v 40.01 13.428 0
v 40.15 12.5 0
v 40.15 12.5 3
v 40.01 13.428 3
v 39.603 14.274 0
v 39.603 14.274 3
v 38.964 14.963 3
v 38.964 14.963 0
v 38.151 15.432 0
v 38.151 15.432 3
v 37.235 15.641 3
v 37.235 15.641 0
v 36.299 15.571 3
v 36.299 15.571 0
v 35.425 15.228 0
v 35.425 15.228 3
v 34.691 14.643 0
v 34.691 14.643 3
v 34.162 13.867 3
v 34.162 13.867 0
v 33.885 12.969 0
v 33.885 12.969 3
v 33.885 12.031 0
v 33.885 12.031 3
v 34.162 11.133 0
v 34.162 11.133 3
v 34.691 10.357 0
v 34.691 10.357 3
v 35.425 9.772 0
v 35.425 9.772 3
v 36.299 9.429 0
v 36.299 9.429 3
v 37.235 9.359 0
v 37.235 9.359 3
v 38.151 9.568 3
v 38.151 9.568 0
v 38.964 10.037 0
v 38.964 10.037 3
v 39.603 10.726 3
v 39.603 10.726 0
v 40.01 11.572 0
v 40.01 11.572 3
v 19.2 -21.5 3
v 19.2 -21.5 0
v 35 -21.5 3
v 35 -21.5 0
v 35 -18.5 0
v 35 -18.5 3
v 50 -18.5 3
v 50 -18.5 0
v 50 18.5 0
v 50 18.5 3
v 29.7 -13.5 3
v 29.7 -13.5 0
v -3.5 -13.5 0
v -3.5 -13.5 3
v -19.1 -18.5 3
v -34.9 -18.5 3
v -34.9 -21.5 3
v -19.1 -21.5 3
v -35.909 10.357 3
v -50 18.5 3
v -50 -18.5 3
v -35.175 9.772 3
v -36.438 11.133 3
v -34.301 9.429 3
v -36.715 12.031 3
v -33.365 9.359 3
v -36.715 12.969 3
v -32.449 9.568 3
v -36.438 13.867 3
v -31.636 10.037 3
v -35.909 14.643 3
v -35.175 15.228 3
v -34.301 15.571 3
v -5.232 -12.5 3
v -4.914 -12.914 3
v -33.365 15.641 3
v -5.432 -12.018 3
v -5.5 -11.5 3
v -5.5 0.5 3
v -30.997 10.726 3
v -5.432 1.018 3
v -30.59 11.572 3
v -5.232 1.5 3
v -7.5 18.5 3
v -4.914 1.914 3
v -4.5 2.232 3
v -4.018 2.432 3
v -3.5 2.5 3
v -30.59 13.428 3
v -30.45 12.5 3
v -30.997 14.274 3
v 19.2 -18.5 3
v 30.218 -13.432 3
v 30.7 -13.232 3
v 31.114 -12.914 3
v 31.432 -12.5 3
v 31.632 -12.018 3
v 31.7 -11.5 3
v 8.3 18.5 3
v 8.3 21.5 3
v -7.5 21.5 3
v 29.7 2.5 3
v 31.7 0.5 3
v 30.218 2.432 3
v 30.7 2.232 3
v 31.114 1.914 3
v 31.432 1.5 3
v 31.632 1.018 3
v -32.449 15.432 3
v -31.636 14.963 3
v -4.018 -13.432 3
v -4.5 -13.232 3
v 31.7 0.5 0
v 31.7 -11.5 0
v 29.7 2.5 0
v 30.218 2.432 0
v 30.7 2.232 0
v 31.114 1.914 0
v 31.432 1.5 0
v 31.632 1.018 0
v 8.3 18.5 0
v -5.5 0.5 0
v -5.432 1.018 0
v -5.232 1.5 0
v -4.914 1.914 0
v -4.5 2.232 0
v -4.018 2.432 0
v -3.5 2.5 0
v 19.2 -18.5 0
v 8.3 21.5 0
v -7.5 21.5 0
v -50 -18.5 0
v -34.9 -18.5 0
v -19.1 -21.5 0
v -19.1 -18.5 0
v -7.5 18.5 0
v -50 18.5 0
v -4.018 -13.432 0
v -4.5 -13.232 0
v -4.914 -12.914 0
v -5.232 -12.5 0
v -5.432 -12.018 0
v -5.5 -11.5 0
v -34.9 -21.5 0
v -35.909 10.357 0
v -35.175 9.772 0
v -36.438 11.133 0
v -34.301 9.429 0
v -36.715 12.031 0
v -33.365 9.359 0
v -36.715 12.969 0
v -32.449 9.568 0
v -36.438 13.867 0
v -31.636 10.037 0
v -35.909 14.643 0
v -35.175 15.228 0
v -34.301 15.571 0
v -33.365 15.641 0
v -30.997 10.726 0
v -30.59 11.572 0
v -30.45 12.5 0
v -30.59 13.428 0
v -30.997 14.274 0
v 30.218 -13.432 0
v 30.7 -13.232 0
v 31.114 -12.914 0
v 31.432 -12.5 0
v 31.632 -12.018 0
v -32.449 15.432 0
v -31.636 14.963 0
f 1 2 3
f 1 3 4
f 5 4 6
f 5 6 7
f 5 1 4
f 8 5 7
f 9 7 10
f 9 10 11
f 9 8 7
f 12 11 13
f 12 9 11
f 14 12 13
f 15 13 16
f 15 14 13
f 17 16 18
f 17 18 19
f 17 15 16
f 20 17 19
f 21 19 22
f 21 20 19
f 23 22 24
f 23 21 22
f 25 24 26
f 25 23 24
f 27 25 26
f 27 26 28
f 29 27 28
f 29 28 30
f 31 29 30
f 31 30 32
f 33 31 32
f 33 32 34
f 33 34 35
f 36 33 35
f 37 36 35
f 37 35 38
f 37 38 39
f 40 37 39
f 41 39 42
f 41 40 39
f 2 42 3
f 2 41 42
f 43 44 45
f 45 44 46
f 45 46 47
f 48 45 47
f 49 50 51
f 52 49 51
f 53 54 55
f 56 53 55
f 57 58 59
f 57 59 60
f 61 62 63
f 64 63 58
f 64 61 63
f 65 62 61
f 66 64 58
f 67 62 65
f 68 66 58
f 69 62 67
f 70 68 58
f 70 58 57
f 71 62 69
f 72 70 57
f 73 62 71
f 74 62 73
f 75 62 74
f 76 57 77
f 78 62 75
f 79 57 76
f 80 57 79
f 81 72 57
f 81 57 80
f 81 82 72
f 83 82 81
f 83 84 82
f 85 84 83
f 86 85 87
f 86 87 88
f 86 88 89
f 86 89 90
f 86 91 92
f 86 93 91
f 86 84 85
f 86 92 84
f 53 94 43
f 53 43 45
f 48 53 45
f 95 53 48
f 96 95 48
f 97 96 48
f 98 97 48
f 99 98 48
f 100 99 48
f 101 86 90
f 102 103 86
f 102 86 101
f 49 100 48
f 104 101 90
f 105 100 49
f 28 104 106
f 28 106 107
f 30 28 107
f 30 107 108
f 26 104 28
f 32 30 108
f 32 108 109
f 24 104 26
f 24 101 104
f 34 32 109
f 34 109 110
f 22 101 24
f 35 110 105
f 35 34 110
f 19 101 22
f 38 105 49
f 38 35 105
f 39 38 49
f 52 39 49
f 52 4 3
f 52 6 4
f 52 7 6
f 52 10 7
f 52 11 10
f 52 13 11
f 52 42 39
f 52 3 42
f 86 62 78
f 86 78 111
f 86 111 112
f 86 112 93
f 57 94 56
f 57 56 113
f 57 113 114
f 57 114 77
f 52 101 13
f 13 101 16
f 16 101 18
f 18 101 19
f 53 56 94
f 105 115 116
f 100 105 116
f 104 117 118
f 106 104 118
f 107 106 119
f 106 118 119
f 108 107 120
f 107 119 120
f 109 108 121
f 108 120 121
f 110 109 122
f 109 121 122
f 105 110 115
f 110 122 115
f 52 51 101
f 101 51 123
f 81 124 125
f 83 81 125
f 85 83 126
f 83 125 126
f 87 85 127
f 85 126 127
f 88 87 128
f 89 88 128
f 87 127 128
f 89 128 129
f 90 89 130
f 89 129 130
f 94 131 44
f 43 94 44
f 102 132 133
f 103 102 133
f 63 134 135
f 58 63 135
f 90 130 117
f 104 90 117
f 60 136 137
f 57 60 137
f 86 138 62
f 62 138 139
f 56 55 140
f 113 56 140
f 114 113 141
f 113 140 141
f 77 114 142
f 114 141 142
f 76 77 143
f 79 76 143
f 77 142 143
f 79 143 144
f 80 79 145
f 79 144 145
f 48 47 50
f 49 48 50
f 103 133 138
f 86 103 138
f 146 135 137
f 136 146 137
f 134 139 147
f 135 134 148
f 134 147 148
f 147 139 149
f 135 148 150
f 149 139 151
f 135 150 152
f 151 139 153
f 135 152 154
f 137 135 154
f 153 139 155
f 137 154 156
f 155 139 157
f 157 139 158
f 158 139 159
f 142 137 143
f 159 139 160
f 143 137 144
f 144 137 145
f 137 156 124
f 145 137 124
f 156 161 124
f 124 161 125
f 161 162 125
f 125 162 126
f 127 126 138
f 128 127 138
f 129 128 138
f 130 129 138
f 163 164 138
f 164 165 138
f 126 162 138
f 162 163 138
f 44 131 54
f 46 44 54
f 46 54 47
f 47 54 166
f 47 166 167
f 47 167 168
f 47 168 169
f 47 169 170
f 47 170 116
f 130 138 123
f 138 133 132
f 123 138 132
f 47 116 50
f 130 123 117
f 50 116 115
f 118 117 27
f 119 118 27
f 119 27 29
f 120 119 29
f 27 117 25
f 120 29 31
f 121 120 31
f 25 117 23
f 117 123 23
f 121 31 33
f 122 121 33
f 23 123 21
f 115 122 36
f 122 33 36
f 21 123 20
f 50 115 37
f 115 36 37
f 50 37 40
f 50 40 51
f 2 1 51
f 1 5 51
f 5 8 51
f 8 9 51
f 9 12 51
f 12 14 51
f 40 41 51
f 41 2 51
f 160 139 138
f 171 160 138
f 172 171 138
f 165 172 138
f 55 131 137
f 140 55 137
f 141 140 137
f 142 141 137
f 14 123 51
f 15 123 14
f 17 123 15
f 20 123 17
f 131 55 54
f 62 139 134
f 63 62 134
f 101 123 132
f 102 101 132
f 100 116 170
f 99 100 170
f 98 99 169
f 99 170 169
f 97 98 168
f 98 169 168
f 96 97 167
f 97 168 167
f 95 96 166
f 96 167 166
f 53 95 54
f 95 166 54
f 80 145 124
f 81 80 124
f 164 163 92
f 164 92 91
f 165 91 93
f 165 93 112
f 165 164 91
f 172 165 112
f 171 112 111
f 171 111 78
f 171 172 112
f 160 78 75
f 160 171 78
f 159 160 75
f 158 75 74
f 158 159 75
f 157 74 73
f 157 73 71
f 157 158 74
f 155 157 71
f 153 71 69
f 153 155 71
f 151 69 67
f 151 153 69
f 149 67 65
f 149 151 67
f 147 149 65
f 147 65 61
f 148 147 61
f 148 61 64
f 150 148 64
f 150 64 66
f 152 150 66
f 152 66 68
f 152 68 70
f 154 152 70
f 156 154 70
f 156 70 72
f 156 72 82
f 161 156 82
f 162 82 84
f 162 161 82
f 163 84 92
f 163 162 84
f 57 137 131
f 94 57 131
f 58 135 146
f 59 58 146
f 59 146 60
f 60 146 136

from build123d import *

# Parameters (mm, degrees)
CROQUIS1_R              = 3.15
SALIENTE_EXTRUIR1_DEPTH = 3


with BuildPart() as part:
    # Croquis1 → Saliente-Extruir1 (new body)
    with BuildSketch(Plane.XY):
        Polygon((8.3, 21.5), (-7.5, 21.5), (-7.5, 18.5), (-50, 18.5), (-50, -18.5), (-34.9, -18.5), (-34.9, -21.5), (-19.1, -21.5), (-19.1, -18.5), (19.2, -18.5), (19.2, -21.5), (35, -21.5), (35, -18.5), (50, -18.5), (50, 18.5), (8.3, 18.5), align=None)
        with BuildLine():
            ThreePointArc((-5.5, 0.5), (-4.914213562, 1.914213562), (-3.5, 2.5))
            Line((-3.5, 2.5), (29.7, 2.5))
            ThreePointArc((29.7, 2.5), (31.114213562, 1.914213562), (31.7, 0.5))
            Line((31.7, 0.5), (31.7, -11.5))
            ThreePointArc((31.7, -11.5), (31.114213562, -12.914213562), (29.7, -13.5))
            Line((29.7, -13.5), (-3.5, -13.5))
            ThreePointArc((-3.5, -13.5), (-4.914213562, -12.914213562), (-5.5, -11.5))
            Line((-5.5, -11.5), (-5.5, 0.5))
        make_face(mode=Mode.SUBTRACT)
        with Locations((-33.6, 12.5)):
            Circle(CROQUIS1_R, mode=Mode.SUBTRACT)
        with Locations((37, 12.5)):
            Circle(CROQUIS1_R, mode=Mode.SUBTRACT)
    extrude(amount=SALIENTE_EXTRUIR1_DEPTH)


solid = part.part
